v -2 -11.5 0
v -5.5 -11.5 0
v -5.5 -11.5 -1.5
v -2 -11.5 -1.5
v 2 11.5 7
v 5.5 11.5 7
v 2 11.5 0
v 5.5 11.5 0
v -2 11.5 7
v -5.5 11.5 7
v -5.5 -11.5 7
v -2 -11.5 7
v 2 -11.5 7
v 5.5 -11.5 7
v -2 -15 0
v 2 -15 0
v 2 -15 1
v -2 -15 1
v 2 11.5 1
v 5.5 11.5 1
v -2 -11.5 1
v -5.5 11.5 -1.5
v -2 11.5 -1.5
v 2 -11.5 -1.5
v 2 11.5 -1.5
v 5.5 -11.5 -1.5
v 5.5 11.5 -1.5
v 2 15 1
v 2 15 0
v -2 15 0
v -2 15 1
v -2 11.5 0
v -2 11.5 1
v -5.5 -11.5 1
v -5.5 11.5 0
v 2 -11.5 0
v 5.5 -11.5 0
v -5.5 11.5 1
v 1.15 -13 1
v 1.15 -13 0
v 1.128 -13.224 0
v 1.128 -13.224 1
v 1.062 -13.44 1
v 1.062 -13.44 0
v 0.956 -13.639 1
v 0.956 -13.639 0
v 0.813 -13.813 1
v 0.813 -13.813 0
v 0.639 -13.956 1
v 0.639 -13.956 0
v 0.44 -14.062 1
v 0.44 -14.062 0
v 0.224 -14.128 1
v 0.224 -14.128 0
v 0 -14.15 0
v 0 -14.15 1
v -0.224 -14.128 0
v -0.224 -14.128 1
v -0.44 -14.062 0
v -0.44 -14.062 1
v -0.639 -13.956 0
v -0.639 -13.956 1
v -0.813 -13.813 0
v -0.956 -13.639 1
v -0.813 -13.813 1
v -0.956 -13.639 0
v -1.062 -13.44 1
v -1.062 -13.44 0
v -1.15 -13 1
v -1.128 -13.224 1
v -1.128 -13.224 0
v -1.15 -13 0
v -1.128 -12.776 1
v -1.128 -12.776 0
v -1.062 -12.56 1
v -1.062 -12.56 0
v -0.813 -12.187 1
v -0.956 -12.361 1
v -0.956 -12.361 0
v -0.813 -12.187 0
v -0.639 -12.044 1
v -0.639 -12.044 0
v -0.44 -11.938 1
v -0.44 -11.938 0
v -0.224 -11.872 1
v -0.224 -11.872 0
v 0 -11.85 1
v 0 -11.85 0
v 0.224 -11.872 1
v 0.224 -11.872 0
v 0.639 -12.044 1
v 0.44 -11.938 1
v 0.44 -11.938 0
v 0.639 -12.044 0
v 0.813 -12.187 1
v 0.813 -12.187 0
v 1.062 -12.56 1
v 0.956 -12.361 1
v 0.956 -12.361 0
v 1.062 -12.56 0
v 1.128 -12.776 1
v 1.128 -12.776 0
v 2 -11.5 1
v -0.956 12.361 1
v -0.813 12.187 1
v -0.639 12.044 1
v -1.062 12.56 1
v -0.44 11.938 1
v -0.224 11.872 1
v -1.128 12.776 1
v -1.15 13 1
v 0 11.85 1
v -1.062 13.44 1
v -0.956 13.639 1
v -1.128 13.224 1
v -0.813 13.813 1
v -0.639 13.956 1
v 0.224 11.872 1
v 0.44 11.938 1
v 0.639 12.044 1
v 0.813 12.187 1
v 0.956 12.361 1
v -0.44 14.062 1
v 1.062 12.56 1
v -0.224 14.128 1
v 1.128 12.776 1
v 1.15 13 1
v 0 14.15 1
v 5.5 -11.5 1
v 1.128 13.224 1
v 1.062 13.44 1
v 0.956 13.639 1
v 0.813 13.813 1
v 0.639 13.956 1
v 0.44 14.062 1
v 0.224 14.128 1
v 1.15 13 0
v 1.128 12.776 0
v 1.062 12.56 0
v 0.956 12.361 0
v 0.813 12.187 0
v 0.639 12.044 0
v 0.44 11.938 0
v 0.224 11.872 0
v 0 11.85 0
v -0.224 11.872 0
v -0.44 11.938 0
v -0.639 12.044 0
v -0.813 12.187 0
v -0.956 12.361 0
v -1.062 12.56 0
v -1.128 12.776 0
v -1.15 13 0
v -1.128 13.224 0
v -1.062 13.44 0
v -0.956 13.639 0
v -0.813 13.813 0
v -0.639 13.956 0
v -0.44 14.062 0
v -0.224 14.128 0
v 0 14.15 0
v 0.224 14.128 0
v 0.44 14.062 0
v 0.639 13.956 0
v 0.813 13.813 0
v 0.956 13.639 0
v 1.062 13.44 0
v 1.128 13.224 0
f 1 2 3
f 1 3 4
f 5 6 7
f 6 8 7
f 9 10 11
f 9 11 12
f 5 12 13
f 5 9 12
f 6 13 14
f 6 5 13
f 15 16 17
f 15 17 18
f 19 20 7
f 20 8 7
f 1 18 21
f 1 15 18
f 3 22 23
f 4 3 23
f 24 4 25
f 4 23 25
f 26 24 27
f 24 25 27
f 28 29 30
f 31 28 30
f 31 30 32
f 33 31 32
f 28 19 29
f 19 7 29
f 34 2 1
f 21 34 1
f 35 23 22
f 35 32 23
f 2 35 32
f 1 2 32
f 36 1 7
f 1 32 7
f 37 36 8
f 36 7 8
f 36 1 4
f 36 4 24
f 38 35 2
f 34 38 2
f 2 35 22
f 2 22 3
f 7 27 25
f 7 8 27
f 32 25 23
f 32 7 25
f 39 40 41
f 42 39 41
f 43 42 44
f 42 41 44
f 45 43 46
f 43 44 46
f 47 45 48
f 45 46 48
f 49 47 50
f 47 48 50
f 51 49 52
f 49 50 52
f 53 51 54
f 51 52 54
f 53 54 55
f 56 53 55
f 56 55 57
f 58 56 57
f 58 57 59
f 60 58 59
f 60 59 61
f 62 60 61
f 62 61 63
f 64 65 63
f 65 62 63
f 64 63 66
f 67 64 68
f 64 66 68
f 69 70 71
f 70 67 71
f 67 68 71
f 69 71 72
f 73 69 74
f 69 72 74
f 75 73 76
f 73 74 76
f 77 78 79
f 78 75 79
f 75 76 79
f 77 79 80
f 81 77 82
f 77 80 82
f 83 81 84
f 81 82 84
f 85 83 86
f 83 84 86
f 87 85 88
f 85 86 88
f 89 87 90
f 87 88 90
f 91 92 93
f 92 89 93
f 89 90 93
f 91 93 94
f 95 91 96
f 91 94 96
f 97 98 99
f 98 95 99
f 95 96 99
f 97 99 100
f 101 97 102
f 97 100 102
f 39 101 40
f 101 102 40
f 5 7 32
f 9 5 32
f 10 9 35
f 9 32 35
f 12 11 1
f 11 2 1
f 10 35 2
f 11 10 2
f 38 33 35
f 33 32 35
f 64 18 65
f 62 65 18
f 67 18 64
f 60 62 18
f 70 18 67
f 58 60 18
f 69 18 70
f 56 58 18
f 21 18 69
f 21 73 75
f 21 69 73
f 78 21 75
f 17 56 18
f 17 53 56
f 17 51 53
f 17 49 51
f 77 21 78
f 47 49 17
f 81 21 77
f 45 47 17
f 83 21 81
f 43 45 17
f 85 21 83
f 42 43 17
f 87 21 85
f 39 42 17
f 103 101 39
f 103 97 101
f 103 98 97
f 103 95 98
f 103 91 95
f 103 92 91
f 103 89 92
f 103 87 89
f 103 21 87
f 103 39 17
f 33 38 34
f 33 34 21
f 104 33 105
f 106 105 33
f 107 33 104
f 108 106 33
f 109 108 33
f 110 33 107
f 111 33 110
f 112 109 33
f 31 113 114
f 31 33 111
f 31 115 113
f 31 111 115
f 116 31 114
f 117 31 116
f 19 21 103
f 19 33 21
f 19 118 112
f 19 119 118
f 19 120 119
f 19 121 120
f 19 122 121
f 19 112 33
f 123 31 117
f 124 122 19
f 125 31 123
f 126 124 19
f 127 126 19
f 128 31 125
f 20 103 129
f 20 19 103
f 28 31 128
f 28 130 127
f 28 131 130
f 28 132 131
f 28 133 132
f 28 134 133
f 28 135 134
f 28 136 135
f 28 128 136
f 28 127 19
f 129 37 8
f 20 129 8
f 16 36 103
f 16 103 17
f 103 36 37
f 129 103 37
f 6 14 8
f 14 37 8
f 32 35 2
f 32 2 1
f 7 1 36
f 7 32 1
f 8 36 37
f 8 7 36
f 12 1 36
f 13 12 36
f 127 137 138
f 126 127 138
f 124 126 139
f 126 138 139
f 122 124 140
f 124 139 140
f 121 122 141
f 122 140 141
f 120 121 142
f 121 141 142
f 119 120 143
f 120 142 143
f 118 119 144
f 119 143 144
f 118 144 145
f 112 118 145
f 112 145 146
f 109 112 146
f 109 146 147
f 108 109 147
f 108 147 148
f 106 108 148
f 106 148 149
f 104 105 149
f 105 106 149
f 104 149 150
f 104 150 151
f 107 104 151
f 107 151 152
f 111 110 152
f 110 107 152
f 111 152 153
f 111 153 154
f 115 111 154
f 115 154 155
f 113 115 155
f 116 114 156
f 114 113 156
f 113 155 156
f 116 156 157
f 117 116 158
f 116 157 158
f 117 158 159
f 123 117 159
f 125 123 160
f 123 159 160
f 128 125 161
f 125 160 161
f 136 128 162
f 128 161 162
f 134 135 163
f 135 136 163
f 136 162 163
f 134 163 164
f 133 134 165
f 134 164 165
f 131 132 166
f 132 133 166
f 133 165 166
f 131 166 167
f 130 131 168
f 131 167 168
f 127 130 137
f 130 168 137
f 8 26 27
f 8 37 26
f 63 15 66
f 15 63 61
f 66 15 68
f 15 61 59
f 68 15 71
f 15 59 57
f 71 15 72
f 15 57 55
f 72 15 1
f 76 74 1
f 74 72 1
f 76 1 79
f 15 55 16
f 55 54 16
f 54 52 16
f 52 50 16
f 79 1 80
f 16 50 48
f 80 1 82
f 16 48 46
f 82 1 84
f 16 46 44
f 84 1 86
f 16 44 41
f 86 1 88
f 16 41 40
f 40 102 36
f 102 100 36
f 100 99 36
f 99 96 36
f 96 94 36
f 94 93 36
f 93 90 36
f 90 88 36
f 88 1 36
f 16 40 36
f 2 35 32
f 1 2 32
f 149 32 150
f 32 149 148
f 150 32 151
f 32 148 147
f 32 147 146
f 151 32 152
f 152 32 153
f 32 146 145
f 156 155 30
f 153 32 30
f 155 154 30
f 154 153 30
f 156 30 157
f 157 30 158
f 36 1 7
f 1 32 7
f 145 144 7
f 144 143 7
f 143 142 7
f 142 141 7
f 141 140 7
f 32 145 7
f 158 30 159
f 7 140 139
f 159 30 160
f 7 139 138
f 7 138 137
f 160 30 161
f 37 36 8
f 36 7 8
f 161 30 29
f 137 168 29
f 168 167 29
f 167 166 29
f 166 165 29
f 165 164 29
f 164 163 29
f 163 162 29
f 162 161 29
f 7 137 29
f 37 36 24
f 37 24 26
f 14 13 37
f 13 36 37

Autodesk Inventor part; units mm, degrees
ref_plane "YZ Plane" through (0, 0, 0) normal (1, 0, 0) x (0, 1, 0)
ref_plane "XZ Plane" through (0, 0, 0) normal (0, 1, 0) x (-1, 0, 0)
ref_plane "XY Plane" through (0, 0, 0) normal (0, 0, 1) x (1, 0, 0)
sketch "Sketch1" plane through (0, 0, 0) normal (0, 0, 1) x (1, 0, 0)
  line L0 (5.5, 11.5) -> (-5.5, 11.5)
  line L1 (-5.5, 11.5) -> (-5.5, -11.5)
  line L2 (-5.5, -11.5) -> (5.5, -11.5)
  line L3 (5.5, -11.5) -> (5.5, 11.5)
  line L4 (5.5, 11.5) -> (-5.5, -11.5) construction
  line L5 (-5.5, 11.5) -> (5.5, -11.5) construction
  line L6 (2, 11.5) -> (2, 15)
  line L7 (2, 15) -> (-2, 15)
  line L8 (-2, 15) -> (-2, 11.5)
  line L9 (5.5, 0) -> (-5.5, 0) construction
  line L10 (2, -11.5) -> (2, -15)
  line L11 (2, -15) -> (-2, -15)
  line L12 (-2, -15) -> (-2, -11.5)
  line L13 (0, 15) -> (0, -15) construction
  circle A0 centre (0, 13) radius 1.15
  circle A1 centre (0, -13) radius 1.15
  point P0 (0, 0)
  point P1 (0, 0)
  dimension "d0" = 23
  dimension "d1" = 11
  dimension "d2" = 2.3
  dimension "d3" = 4
  dimension "d4" = 3.5
  dimension "d5" = 26
extrude "Extrusion1" add sketch "Sketch1" along normal blind 1
extrude "Extrusion2" add sketch "Sketch1" along normal blind 7 separate body contours L3 L2 L1 L0
extrude "Extrusion3" add sketch "Sketch1" against normal blind 1.5 separate body contours L3 L2 L1 L0
properties part number "DC-Voltmeter-Red"
